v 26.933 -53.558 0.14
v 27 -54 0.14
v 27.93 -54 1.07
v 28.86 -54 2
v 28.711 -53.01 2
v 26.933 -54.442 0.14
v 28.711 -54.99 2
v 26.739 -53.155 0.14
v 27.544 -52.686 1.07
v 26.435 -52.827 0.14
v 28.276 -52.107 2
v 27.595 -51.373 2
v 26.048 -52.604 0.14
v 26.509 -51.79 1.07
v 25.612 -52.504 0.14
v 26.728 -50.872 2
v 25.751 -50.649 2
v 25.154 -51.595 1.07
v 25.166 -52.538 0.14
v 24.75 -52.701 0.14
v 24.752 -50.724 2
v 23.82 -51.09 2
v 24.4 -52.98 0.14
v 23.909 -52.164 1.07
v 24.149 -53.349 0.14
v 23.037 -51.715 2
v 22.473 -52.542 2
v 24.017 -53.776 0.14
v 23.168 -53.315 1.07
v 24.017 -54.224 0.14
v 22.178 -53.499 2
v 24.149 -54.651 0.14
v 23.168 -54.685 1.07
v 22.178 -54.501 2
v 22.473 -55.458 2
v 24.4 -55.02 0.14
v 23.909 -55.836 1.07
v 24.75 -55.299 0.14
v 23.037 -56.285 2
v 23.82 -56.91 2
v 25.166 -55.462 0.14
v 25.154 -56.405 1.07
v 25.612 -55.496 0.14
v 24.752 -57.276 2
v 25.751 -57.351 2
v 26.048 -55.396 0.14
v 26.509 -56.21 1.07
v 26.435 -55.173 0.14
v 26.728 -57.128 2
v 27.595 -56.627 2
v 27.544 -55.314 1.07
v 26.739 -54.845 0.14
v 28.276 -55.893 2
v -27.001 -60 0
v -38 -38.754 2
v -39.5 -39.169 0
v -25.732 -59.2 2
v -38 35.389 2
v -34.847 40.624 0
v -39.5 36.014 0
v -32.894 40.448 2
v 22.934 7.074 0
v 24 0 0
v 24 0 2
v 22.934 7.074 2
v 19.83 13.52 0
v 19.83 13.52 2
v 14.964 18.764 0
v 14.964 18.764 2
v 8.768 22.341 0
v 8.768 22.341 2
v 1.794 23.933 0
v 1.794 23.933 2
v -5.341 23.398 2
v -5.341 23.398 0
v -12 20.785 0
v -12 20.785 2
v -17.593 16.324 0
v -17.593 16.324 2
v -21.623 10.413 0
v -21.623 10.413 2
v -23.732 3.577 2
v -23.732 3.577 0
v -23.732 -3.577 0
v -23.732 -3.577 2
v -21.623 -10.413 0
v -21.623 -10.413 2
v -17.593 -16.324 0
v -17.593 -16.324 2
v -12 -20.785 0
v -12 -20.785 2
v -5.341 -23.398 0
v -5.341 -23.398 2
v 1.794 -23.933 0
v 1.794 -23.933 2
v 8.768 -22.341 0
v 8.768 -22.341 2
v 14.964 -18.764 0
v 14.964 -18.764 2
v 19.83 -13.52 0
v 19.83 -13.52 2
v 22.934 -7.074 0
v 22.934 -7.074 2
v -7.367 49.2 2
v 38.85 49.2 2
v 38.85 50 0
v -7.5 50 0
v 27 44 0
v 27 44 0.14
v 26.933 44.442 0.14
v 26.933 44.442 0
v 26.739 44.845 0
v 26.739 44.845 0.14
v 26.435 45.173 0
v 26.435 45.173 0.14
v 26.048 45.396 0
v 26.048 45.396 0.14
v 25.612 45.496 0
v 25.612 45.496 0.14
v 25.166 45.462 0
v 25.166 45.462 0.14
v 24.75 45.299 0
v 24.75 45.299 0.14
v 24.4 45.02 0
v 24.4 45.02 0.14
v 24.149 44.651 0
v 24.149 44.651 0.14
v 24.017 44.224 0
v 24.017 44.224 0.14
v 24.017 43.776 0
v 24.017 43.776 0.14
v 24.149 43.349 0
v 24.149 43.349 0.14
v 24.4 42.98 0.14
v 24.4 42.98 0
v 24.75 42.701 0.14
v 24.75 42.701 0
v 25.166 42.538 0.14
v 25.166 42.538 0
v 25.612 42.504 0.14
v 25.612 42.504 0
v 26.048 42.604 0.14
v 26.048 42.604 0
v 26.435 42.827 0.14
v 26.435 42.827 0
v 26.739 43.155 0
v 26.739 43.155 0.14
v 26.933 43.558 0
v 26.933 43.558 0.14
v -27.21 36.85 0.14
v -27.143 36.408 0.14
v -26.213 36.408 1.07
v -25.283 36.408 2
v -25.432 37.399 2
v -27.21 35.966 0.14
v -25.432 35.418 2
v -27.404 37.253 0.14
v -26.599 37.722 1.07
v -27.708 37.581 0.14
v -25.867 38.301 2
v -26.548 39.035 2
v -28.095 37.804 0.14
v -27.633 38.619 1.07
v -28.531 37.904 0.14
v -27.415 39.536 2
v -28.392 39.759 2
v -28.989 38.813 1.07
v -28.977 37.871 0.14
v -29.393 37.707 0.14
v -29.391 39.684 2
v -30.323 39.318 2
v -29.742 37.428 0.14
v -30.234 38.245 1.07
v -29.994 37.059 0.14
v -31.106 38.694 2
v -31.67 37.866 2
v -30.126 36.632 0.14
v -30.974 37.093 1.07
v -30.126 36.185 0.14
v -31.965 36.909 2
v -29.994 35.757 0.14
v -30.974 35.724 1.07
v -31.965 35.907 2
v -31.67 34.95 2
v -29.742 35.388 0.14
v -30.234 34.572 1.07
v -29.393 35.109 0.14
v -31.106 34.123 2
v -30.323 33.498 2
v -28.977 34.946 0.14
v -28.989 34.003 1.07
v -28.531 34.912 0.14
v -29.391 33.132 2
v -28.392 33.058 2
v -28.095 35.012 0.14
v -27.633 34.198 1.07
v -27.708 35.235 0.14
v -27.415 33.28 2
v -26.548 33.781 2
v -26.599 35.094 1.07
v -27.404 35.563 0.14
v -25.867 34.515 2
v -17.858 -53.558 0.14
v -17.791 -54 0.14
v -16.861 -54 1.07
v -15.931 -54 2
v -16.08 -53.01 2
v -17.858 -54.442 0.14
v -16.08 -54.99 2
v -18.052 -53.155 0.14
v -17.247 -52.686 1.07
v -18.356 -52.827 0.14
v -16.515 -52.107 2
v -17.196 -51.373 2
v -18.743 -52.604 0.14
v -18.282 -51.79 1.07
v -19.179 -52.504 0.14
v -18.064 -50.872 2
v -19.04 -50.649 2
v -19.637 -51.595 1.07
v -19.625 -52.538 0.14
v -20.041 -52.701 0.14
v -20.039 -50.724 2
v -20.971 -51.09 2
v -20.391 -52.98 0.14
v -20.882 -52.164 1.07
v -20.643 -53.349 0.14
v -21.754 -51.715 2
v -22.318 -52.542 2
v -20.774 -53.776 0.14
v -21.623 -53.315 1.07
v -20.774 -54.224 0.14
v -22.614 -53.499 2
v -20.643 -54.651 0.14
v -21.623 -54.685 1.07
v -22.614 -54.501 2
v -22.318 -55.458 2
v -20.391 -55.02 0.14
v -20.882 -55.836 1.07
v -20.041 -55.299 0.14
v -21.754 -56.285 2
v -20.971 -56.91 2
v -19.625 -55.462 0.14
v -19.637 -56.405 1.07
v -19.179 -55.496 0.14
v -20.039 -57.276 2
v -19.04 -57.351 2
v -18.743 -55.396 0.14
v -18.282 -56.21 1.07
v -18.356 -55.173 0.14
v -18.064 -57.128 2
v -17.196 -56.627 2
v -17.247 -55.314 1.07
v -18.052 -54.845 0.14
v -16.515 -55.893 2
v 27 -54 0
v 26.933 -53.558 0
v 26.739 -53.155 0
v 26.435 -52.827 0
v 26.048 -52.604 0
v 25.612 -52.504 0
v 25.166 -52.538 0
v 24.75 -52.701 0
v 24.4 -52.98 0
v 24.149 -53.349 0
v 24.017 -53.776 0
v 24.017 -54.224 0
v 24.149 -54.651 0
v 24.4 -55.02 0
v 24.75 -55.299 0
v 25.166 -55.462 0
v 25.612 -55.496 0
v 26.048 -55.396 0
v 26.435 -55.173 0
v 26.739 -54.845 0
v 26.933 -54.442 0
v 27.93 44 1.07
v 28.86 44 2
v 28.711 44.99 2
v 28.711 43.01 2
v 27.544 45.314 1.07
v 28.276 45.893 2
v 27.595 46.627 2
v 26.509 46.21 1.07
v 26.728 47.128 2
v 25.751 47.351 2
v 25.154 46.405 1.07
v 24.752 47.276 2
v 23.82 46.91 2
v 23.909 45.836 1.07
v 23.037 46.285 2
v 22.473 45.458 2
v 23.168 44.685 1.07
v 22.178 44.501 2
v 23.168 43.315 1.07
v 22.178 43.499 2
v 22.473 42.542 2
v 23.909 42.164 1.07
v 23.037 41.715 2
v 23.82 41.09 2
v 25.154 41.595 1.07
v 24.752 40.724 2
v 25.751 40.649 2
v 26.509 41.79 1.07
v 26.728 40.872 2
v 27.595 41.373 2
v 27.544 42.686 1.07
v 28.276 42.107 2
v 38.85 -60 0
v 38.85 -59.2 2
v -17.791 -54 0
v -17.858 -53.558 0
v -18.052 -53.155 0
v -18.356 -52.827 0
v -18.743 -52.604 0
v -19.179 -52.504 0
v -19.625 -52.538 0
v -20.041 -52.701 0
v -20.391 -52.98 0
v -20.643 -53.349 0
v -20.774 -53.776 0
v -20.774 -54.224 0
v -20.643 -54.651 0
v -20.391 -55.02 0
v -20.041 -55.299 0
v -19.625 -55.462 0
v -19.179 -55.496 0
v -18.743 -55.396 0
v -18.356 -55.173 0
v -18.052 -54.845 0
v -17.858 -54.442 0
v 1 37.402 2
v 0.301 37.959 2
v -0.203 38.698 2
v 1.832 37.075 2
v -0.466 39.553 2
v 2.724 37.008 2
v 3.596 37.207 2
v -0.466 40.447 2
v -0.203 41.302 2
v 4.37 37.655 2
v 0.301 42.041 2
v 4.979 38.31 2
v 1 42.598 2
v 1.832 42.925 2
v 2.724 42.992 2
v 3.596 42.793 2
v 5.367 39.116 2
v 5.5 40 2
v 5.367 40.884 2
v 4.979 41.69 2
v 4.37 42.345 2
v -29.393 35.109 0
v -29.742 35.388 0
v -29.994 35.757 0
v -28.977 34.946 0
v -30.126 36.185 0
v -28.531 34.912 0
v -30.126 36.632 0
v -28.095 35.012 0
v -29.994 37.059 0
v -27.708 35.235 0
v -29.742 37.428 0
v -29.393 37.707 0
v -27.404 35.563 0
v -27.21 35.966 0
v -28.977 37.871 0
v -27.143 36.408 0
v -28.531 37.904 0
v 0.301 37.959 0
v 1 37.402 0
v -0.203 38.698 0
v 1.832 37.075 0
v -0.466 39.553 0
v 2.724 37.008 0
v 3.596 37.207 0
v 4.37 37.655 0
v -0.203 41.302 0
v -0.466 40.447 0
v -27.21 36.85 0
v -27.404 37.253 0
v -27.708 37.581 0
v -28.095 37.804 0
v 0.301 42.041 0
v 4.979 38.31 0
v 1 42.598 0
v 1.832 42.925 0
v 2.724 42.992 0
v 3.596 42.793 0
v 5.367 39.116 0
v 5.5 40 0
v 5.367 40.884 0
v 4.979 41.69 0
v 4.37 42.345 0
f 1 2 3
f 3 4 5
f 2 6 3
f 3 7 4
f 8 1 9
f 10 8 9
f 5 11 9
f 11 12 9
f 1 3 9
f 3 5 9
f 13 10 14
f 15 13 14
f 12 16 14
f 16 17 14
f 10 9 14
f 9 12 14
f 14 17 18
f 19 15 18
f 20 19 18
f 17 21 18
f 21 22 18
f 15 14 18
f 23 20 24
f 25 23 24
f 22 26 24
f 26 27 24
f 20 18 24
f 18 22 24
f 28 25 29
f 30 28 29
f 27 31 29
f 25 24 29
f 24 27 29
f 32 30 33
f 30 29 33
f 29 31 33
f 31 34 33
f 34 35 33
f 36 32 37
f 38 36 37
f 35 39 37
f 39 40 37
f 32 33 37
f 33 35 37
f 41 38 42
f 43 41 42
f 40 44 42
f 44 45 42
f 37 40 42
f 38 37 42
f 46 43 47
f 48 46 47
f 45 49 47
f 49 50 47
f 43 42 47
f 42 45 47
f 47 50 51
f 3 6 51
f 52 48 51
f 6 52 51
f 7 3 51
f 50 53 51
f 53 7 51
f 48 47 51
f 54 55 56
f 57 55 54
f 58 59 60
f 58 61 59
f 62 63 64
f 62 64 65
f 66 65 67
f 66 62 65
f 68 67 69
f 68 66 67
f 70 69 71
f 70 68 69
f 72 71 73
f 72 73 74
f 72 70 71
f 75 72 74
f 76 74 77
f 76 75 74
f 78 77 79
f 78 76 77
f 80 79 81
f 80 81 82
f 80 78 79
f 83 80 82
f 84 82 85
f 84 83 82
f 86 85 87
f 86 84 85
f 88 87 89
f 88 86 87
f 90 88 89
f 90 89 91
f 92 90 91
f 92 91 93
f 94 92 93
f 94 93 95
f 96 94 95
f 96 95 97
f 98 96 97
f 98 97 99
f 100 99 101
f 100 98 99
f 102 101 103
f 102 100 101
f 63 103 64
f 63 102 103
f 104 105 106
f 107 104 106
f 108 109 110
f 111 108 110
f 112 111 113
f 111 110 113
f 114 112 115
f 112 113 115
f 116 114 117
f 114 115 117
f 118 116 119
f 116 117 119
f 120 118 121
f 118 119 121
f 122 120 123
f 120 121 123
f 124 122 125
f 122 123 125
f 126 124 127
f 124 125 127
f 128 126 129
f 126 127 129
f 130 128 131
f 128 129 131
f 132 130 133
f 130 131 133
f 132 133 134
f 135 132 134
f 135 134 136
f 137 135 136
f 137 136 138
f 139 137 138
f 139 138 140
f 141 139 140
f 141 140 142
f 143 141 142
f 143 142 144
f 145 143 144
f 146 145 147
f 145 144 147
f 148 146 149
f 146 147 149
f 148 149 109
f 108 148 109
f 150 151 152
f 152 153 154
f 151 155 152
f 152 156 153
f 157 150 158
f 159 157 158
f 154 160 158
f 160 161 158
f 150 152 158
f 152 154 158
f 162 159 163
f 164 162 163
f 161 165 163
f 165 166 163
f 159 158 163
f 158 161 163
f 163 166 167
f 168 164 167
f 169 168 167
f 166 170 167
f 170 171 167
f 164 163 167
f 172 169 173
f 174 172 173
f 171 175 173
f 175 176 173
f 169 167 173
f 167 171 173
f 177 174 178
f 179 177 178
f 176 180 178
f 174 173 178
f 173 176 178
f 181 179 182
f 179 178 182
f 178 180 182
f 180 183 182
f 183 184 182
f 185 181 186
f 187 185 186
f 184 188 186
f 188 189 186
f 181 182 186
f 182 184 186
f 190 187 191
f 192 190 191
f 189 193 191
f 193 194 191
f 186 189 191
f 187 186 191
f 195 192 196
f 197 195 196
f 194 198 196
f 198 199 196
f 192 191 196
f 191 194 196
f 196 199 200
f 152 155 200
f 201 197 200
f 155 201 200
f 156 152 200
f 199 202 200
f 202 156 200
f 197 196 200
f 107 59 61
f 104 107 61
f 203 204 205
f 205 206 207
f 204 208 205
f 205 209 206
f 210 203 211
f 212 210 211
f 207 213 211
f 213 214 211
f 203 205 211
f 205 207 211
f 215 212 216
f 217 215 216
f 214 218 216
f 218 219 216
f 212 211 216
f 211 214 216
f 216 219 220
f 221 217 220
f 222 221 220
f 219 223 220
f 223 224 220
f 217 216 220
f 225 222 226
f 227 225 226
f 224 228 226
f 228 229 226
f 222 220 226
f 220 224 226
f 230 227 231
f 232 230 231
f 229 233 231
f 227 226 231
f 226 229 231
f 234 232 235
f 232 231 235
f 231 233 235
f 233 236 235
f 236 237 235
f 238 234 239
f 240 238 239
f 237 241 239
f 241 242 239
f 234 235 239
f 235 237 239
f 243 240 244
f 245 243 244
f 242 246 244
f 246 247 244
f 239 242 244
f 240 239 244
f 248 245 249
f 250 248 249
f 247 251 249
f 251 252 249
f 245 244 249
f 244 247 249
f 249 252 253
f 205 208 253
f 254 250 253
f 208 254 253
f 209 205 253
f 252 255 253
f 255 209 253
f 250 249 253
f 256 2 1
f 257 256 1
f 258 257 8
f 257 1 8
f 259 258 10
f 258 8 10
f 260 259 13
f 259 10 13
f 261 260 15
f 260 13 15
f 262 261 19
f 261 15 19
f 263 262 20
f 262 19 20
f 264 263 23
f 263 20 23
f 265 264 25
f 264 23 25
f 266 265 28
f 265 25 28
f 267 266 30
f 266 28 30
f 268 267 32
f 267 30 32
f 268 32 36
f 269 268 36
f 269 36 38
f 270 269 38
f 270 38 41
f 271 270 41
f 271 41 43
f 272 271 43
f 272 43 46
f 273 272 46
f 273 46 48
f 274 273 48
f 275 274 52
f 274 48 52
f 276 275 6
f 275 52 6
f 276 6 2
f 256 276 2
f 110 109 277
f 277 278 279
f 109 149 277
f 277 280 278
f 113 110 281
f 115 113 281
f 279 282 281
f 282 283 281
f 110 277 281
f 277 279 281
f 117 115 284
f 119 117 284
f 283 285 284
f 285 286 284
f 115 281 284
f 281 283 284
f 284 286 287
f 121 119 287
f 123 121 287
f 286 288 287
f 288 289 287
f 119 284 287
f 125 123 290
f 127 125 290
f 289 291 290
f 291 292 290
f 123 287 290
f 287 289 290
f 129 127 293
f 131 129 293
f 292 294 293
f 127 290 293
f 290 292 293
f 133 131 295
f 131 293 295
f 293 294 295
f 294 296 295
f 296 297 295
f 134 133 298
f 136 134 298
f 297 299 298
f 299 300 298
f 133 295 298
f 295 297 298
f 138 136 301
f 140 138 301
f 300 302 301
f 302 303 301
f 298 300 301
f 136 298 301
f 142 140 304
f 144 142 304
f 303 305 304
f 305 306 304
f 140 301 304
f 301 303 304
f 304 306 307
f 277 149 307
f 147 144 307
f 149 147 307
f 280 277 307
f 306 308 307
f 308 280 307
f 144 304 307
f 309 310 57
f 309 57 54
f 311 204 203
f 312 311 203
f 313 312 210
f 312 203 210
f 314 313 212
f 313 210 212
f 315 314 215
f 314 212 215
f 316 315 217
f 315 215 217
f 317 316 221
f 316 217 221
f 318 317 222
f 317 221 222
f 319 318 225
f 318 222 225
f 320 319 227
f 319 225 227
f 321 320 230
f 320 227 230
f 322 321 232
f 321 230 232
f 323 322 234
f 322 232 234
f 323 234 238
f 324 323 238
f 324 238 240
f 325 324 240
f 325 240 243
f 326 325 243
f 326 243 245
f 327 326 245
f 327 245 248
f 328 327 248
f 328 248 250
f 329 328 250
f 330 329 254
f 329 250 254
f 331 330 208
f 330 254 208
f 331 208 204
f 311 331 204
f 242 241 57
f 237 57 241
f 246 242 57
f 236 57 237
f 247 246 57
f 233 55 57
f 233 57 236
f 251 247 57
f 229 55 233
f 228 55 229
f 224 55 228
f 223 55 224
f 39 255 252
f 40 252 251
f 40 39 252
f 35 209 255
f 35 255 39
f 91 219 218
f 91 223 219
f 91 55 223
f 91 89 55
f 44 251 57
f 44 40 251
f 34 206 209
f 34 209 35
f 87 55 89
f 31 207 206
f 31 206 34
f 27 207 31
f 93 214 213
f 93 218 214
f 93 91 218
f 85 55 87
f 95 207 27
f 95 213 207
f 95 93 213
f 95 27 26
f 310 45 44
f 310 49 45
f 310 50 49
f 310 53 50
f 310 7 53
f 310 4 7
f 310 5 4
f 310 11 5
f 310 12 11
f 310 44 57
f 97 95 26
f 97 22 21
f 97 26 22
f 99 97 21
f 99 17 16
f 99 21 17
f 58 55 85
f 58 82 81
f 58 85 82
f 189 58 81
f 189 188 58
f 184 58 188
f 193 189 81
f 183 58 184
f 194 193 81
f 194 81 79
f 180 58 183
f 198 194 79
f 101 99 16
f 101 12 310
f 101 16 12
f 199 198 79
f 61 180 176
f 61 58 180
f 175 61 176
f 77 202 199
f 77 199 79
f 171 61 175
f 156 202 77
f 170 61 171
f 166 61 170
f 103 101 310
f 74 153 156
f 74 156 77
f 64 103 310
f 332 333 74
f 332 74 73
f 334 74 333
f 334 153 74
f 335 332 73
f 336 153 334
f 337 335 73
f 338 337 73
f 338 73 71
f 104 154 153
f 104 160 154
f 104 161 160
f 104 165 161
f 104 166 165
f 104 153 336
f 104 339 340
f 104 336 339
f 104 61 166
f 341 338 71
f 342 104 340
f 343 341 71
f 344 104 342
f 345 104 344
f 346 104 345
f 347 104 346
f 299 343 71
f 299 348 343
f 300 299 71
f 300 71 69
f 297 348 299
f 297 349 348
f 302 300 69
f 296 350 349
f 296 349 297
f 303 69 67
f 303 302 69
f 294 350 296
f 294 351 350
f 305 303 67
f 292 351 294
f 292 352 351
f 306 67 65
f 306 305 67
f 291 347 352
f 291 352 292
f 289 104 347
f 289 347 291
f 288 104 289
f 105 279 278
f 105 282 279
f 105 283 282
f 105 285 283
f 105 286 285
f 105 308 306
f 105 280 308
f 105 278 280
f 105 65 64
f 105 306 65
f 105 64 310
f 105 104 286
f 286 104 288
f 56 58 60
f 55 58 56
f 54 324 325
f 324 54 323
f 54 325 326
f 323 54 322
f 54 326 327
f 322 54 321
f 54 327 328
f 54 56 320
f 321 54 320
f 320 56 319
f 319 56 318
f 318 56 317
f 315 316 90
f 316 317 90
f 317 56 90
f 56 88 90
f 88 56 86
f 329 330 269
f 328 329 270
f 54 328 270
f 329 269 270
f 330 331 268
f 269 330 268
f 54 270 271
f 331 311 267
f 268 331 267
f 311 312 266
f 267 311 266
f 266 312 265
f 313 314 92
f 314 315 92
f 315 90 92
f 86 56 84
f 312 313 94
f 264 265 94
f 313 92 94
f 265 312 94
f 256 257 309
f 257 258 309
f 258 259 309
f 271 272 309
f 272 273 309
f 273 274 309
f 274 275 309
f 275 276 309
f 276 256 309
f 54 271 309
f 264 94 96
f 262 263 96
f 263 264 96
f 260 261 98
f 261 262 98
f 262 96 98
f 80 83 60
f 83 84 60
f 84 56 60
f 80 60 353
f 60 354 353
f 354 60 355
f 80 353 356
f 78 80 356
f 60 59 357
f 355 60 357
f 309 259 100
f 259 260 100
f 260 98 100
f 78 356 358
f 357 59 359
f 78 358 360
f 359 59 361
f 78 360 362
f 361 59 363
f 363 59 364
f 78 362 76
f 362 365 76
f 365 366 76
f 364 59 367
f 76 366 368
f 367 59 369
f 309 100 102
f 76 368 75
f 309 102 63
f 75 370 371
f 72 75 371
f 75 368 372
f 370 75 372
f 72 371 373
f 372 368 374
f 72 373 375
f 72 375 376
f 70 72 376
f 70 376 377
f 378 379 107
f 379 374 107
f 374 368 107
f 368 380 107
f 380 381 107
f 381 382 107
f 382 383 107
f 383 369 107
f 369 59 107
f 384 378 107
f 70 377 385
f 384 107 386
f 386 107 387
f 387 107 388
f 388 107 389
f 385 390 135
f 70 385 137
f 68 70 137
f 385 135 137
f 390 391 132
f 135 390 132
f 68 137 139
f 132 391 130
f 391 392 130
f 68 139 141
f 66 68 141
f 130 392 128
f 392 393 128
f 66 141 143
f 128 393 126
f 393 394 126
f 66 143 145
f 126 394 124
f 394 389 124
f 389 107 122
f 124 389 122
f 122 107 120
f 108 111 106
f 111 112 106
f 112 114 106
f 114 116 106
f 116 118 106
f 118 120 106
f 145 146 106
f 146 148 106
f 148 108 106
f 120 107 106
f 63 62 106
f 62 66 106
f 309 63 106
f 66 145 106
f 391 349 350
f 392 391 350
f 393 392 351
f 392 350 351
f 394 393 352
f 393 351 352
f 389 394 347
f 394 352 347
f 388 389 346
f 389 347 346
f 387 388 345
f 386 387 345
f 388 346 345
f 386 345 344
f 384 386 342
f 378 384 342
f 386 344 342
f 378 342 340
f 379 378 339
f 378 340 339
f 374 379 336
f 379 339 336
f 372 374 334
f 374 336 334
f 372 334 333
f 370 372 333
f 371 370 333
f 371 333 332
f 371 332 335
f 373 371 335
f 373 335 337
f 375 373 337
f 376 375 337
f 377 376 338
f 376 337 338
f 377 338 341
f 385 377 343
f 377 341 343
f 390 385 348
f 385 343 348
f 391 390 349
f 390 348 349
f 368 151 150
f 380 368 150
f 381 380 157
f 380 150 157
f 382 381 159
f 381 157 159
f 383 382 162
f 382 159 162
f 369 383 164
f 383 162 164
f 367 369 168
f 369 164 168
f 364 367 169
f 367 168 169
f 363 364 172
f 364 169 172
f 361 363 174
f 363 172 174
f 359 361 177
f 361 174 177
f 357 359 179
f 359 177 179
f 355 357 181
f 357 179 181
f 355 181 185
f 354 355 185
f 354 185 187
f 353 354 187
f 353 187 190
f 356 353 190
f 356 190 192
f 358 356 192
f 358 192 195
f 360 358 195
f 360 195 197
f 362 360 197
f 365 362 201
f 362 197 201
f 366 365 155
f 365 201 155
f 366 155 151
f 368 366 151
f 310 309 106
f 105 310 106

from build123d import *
from OCP.BRepFilletAPI import BRepFilletAPI_MakeChamfer

# Parameters (mm, degrees)
SKETCH1_R           = 24
BOSS_EXTRUDE1_DEPTH = 2
CHAMFER1_SIZE       = 2
CHAMFER1_SIZE_2     = 1.5
SKETCH3_R           = 3
SKETCH3_R_2         = 1.5
CUT_EXTRUDE1_DEPTH  = 2
CHAMFER2_SIZE       = 0.8
CHAMFER2_SIZE_2     = 2
CHAMFER3_SIZE       = 1.86


# Some blends are built 0.0001 mm under size
with BuildPart() as part:
    # Sketch1 → Boss-Extrude1 (new body)
    with BuildSketch(Plane.XY):
        Polygon((38.85, -60), (38.85, 50), (-7.5, 50), (-34.847350762, 40.623765453), (-39.5, 36.014047515), (-39.5, -39.169048105), (-27.001428863, -60), align=None)
        Circle(SKETCH1_R, mode=Mode.SUBTRACT)
    extrude(amount=BOSS_EXTRUDE1_DEPTH)

    # Chamfer1
    chamfer1_edges_1 = [part.edges().sort_by_distance(p)[0] for p in [
        (-39.5, -1.577500295, 2),
    ]]
    chamfer1_side_1 = [part.faces().sort_by_distance(p)[0] for p in [
        (-39.5, -1.577500295, 1.97),
    ]]
    chamfer1_edges_2 = [part.edges().sort_by_distance(p)[0] for p in [
        (-33.250714432, -49.584524053, 2),
    ]]
    chamfer1_side_2 = [part.faces().sort_by_distance(p)[0] for p in [
        (-33.250714432, -49.584524053, 1.97),
    ]]
    chamfer1_edges_3 = [part.edges().sort_by_distance(p)[0] for p in [
        (-37.173675381, 38.318906484, 2),
    ]]
    chamfer1_side_3 = [part.faces().sort_by_distance(p)[0] for p in [
        (-37.173675381, 38.318906484, 1.97),
    ]]
    chamfer1 = BRepFilletAPI_MakeChamfer(part.part.solid().wrapped)
    for e in chamfer1_edges_1:
        chamfer1.Add(CHAMFER1_SIZE - 0.0001, CHAMFER1_SIZE_2 - 0.0001, e.wrapped, chamfer1_side_1[0].wrapped)
    for e in chamfer1_edges_2:
        chamfer1.Add(CHAMFER1_SIZE - 0.0001, CHAMFER1_SIZE_2 - 0.0001, e.wrapped, chamfer1_side_2[0].wrapped)
    for e in chamfer1_edges_3:
        chamfer1.Add(CHAMFER1_SIZE - 0.0001, CHAMFER1_SIZE_2 - 0.0001, e.wrapped, chamfer1_side_3[0].wrapped)
    add(Compound.cast(chamfer1.Shape()), mode=Mode.REPLACE)  # a hair under: the kernel refuses the full size

    # Sketch3 → Cut-Extrude1 (cut)
    with BuildSketch(Plane.XY.offset(2)):
        with Locations((2.5, 40)):
            Circle(SKETCH3_R)
        with Locations((-19.291144984, -54)):
            Circle(SKETCH3_R_2)
        with Locations((25.5, -54)):
            Circle(SKETCH3_R_2)
        with Locations((25.5, 44)):
            Circle(SKETCH3_R_2)
        with Locations((-28.642921649, 36.408141149)):
            Circle(SKETCH3_R_2)
    extrude(amount=-CUT_EXTRUDE1_DEPTH, mode=Mode.SUBTRACT)

    # Chamfer2
    # the kernel refuses this chamfer: 2, 0.8 mm, written as the material it takes off along each edge
    with BuildSketch(Plane(origin=(-30.438487192, -60, 2), x_dir=(0, 0.996016754004022, 0.08916628142572558), z_dir=(1, 0, 0))) as chamfer2_piece_1:
        Polygon((CHAMFER2_SIZE * 0.996016754004, -CHAMFER2_SIZE * 0.0891662814257), (-CHAMFER2_SIZE_2 * 0.0891662814257, -CHAMFER2_SIZE_2 * 0.996016754004), (0, 0), align=None)
    extrude(amount=74.47471447, mode=Mode.SUBTRACT)
    with BuildSketch(Plane(origin=(44.036227278, 50, 2), x_dir=(0, -0.996016754004022, 0.08916628142572558), z_dir=(-1, 0, 0))) as chamfer2_piece_2:
        Polygon((CHAMFER2_SIZE * 0.996016754004, -CHAMFER2_SIZE * 0.0891662814257), (-CHAMFER2_SIZE_2 * 0.0891662814257, -CHAMFER2_SIZE_2 * 0.996016754004), (0, 0), align=None)
    extrude(amount=56.722454557, mode=Mode.SUBTRACT)
    with BuildSketch(Plane(origin=(-2.594109331, 51.682019658, 2), x_dir=(-0.0046450347702198845, 0.013548018079808006, -0.9998974321689664), z_dir=(-0.945945945945946, -0.3243243243243241, 0))) as chamfer2_piece_3:
        Polygon((CHAMFER2_SIZE_2 * 0.999897432169, CHAMFER2_SIZE_2 * 0.0143221905415), (-CHAMFER2_SIZE * 0.0143221905415, CHAMFER2_SIZE * 0.999897432169), (0, 0), align=None)
    extrude(amount=35.83751357, mode=Mode.SUBTRACT)

    # Chamfer3
    chamfer3_edges = [part.edges().sort_by_distance(p)[0] for p in [
        (-20.791144984, -54, 2),
        (24, -54, 2),
        (24, 44, 2),
        (-30.142921649, 36.408141149, 2),
    ]]
    chamfer(chamfer3_edges, length=CHAMFER3_SIZE)


solid = part.part
